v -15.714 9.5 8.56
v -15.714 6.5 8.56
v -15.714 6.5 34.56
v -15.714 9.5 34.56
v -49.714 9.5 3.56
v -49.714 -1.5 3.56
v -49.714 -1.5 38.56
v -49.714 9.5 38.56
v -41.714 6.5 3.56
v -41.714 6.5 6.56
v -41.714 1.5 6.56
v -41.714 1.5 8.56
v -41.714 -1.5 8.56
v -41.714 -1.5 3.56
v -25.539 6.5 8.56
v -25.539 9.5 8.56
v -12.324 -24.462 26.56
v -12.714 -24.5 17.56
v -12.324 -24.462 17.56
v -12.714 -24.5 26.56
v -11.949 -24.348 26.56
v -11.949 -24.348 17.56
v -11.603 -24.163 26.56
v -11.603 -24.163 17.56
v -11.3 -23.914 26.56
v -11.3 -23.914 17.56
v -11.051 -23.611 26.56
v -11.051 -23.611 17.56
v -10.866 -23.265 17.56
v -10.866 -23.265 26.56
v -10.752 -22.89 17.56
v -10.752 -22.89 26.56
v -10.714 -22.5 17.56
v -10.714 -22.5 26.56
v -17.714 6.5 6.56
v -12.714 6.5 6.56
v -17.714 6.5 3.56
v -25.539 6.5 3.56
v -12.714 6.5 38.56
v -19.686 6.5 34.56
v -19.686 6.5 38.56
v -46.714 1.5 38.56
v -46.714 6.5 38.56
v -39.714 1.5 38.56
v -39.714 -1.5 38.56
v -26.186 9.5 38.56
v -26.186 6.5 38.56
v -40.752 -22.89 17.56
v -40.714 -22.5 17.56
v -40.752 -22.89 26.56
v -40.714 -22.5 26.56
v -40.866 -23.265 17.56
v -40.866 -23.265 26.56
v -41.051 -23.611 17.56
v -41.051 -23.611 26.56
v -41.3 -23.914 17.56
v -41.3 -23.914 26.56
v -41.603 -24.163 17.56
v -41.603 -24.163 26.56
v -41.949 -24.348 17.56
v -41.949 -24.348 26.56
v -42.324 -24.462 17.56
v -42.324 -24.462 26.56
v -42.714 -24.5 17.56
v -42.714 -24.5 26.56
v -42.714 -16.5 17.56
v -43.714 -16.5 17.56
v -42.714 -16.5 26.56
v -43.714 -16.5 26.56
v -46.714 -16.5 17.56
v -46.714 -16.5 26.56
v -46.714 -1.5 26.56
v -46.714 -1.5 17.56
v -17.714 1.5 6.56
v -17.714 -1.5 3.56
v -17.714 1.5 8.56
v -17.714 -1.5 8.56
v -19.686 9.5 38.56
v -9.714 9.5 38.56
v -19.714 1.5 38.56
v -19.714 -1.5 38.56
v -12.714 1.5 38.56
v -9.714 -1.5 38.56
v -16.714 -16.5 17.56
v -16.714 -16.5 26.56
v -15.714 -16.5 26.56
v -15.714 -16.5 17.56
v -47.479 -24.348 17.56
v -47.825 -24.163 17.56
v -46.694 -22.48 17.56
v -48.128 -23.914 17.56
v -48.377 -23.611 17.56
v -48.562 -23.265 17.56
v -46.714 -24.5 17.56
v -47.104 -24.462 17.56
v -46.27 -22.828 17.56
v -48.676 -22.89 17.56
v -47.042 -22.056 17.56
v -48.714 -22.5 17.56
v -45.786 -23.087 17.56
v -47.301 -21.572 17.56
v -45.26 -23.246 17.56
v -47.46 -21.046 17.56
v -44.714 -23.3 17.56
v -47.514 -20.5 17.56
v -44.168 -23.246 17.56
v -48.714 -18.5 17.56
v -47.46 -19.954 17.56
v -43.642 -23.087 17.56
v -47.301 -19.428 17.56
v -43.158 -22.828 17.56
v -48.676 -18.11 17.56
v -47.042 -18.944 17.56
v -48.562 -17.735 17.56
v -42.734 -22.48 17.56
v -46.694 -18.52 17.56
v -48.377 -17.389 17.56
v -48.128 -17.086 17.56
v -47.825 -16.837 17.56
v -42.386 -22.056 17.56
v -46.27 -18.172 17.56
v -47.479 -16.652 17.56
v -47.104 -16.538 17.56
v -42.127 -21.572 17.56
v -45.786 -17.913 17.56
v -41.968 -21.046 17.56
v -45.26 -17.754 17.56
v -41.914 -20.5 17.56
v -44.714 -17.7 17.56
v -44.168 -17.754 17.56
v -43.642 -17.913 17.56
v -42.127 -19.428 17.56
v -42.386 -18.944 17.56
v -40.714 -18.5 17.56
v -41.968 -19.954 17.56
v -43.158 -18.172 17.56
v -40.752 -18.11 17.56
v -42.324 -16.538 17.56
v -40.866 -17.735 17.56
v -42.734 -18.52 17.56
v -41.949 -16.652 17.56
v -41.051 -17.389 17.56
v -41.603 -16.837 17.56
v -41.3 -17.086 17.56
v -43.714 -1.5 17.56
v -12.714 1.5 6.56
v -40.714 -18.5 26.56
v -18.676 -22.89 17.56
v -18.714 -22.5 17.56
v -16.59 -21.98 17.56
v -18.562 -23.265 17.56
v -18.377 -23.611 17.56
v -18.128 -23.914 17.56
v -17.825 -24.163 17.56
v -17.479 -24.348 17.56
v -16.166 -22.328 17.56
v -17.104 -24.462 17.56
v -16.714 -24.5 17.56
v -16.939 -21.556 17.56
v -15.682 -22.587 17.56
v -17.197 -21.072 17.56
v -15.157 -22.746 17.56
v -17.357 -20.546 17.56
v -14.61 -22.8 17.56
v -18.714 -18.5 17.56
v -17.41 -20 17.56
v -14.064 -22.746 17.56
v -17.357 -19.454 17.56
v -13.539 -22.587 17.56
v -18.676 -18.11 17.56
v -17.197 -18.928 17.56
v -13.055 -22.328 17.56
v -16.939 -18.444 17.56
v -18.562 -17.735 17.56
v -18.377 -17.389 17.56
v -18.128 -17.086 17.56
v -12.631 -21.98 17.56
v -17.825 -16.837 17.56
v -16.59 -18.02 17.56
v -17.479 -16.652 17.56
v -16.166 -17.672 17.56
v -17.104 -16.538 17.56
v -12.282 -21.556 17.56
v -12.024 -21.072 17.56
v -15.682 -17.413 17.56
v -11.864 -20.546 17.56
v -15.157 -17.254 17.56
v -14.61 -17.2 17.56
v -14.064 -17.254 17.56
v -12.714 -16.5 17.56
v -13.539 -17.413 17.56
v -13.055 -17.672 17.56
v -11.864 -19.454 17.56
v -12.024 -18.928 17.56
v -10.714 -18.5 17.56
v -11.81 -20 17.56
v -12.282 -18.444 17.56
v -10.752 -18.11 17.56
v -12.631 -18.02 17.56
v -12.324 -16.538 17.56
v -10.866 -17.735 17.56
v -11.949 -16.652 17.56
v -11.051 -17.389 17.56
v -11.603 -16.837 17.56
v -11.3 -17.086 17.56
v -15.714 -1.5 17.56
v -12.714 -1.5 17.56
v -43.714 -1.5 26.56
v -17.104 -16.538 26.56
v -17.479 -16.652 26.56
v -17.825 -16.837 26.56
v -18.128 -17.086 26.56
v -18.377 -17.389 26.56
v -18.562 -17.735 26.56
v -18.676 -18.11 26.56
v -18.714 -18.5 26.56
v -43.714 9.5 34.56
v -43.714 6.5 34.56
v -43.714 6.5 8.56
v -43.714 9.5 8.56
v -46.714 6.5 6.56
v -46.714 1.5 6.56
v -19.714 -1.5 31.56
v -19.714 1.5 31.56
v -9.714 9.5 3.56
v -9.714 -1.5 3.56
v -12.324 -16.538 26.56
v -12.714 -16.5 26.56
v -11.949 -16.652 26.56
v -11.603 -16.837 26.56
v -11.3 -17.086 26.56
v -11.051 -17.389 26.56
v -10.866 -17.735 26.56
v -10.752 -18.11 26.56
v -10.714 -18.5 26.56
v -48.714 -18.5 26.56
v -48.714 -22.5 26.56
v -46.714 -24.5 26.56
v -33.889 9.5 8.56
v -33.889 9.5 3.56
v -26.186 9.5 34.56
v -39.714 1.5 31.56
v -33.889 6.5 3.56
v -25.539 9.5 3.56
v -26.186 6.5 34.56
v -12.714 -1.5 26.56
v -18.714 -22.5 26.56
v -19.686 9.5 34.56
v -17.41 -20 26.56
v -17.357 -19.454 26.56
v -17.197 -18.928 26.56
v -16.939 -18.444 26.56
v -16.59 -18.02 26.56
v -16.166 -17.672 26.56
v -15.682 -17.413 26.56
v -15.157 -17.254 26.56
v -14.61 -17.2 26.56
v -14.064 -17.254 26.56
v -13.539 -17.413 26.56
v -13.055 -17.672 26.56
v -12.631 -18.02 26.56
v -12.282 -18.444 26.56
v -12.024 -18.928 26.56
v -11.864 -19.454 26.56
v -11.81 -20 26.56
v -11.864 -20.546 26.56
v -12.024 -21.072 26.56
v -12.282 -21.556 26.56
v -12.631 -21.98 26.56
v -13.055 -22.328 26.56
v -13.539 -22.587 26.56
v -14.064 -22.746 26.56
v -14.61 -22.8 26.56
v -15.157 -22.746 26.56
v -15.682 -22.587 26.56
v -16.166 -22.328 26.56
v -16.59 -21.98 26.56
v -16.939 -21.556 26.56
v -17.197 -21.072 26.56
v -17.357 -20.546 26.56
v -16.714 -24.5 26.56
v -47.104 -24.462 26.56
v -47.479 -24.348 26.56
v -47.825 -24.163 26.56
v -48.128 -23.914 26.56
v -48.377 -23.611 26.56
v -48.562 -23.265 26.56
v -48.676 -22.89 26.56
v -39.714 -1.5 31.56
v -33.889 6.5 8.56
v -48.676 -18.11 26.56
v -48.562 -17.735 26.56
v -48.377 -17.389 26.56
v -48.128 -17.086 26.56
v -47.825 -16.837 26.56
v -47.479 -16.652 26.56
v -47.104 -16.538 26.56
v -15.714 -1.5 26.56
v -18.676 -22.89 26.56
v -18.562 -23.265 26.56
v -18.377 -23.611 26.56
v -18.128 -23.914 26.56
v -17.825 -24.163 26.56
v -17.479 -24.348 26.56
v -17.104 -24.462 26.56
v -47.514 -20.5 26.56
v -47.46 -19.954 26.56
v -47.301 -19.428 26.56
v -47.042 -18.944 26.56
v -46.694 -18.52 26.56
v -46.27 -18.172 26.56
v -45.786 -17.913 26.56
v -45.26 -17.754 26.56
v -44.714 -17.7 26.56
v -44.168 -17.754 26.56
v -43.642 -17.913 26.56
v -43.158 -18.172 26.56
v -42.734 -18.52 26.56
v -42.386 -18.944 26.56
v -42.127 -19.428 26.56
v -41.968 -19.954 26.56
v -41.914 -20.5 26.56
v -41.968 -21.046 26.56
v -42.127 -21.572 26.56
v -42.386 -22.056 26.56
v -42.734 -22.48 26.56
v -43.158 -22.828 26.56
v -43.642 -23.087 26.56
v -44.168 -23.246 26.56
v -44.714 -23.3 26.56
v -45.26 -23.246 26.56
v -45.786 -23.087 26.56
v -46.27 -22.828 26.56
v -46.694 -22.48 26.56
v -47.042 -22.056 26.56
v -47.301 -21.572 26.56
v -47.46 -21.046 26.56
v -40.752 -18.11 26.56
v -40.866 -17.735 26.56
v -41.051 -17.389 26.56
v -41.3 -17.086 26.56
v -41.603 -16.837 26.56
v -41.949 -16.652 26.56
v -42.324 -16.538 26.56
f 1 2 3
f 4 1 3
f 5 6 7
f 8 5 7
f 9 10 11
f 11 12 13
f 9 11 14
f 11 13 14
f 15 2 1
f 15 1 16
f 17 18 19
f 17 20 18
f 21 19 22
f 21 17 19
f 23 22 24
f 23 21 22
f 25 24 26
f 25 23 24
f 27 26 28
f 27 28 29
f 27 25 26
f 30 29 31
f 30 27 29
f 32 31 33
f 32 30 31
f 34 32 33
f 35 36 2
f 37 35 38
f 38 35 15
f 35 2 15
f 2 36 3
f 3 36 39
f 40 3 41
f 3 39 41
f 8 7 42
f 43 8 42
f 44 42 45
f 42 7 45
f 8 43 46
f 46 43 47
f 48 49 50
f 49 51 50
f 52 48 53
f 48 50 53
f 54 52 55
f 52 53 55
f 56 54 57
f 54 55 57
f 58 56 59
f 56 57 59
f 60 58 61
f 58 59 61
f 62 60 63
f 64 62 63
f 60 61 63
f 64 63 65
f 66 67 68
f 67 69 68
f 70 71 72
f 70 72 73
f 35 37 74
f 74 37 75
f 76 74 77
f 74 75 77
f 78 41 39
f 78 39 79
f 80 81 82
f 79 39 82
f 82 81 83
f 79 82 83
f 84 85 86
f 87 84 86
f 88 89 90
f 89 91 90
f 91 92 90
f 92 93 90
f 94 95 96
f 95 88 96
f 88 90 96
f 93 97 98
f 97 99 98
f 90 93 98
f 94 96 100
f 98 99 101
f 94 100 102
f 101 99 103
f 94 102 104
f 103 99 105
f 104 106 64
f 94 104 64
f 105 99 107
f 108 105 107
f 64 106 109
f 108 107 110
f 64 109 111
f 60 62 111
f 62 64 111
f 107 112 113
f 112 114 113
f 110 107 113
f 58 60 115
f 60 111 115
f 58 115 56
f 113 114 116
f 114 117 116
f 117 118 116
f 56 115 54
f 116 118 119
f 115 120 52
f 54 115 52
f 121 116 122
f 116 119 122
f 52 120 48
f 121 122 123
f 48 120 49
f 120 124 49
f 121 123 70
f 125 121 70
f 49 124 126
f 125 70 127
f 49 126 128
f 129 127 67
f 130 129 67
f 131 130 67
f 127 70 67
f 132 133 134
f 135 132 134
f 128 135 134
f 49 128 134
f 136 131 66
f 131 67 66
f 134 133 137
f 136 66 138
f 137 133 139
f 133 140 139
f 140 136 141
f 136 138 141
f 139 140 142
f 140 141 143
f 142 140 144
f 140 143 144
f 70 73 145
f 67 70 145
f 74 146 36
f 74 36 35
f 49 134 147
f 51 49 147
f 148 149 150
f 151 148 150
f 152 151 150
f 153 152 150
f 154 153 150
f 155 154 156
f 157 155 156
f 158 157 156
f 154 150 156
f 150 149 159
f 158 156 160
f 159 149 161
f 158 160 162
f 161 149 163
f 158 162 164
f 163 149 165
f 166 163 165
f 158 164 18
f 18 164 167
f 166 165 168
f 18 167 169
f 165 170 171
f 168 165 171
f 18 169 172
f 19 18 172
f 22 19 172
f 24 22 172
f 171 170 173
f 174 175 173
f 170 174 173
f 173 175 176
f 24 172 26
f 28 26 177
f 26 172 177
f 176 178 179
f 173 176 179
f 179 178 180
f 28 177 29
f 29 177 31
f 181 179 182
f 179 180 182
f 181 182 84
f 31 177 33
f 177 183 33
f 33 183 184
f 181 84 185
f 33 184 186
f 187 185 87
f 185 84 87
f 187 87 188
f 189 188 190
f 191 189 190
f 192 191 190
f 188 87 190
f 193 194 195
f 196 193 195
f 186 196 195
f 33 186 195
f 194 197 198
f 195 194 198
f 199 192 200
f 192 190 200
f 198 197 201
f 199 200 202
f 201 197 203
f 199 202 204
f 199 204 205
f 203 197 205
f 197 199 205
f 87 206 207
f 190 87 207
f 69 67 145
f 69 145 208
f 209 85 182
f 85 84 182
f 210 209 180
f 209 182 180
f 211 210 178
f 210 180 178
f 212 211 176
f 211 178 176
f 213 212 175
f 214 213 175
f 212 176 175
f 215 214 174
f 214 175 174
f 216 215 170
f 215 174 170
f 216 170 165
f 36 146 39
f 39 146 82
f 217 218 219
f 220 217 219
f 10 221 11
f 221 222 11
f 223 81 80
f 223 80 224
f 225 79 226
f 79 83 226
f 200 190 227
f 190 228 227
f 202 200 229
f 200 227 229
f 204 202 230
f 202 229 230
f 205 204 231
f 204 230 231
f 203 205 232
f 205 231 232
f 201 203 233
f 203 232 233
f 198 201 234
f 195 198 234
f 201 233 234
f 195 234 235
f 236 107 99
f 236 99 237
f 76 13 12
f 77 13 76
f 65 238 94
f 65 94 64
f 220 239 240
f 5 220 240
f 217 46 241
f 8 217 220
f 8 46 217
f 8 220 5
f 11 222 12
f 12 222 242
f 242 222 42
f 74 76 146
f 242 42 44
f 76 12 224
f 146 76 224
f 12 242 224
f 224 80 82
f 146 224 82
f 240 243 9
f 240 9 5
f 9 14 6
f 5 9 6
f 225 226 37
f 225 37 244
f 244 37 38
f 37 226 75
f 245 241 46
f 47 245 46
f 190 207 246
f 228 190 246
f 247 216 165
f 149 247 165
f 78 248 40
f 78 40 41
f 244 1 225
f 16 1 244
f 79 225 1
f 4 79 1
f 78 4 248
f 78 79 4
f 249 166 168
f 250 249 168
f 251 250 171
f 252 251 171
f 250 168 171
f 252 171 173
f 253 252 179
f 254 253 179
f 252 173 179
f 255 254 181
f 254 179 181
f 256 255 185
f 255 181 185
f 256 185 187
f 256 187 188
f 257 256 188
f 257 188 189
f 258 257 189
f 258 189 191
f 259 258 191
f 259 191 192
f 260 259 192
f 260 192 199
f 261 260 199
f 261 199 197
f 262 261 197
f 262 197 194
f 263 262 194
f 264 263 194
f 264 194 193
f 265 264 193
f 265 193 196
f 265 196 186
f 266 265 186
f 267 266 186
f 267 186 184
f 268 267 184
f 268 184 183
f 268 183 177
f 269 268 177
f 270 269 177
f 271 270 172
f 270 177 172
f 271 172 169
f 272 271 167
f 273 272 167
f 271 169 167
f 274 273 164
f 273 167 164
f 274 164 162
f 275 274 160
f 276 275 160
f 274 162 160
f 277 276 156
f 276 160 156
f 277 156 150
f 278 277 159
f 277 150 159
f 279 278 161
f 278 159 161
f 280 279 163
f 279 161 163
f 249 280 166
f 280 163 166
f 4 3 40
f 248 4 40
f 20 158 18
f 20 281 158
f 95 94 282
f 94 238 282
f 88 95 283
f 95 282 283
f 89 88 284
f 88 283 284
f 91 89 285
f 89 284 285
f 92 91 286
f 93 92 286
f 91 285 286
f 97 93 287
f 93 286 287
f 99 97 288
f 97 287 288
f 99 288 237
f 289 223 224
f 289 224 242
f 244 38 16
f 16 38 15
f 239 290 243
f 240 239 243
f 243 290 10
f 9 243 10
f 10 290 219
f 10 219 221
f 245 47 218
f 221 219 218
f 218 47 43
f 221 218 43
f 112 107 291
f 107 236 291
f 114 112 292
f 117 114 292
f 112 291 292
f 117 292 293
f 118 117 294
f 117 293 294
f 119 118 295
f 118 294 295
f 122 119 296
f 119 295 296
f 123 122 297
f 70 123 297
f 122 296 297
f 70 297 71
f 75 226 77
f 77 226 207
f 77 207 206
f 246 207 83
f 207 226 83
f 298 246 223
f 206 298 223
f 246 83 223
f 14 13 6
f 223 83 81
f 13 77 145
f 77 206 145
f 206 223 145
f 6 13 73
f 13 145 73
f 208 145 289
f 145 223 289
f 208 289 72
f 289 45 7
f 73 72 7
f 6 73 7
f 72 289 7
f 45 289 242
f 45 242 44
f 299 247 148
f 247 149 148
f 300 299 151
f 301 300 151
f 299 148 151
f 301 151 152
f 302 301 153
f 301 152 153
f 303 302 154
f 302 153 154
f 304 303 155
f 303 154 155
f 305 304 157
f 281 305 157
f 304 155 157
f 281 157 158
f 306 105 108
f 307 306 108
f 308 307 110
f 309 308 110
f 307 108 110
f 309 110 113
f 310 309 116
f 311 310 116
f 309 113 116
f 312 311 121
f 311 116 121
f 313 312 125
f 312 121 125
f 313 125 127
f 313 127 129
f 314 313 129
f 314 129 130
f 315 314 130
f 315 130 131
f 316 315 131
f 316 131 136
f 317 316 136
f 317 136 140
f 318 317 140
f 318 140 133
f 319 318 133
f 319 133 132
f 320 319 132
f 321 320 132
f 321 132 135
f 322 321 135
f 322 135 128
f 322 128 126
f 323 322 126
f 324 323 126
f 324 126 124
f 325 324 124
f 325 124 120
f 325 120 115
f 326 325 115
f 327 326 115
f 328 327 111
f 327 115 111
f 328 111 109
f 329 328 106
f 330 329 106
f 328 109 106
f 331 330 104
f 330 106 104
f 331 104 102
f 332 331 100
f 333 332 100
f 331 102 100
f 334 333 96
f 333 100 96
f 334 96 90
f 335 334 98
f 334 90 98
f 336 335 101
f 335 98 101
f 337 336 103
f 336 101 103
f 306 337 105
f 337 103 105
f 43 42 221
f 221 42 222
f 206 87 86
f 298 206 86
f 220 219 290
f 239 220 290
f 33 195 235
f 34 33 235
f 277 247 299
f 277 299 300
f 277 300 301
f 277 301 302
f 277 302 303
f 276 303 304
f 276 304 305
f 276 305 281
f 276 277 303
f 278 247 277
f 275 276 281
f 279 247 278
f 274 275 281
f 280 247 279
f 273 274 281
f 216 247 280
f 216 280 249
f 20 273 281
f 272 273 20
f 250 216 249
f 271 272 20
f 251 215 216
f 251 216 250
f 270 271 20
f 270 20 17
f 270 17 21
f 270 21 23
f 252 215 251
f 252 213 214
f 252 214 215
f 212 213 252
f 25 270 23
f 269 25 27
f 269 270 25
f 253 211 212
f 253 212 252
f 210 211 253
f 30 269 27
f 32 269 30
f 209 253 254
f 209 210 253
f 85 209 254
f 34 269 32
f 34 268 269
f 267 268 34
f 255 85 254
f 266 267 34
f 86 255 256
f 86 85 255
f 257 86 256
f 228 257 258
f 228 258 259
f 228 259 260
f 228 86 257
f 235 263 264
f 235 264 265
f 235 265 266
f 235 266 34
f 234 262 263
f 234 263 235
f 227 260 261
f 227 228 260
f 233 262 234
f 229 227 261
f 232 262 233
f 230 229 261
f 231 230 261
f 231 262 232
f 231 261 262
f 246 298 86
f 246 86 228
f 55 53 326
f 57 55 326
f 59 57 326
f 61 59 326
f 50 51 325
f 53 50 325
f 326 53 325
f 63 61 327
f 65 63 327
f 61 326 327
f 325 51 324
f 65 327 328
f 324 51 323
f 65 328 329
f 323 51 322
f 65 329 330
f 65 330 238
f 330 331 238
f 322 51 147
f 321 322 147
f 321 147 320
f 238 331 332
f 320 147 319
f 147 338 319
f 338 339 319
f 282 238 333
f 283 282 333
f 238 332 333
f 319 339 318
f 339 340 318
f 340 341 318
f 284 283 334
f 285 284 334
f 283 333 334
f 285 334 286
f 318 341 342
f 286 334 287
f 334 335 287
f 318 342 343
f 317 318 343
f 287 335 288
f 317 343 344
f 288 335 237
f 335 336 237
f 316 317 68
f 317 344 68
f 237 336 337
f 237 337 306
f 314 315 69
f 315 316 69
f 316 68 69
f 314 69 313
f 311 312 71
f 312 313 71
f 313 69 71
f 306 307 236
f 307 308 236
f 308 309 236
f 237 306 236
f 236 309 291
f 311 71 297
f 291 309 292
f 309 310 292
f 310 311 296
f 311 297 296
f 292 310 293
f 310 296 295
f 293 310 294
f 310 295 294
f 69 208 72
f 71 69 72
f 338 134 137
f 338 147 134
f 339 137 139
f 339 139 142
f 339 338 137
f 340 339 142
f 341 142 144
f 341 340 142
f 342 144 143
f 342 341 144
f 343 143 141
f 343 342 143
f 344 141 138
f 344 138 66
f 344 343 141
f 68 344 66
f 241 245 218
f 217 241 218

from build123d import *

# Parameters (mm, degrees)
F1_DEPTH  = 1.5
F2_W      = 3
F2_H      = 9
F3_DEPTH  = 15
F4_W      = 2
F4_H      = 9
F5_DEPTH  = 8
F7_D      = 5.6
F8_R      = 1.99999
F9_W      = 5
F9_H      = 3
F10_DEPTH = 3
F12_DEPTH = 2
F13_DEPTH = 2
F14_W     = 3
F14_H     = 4
F14_W_2   = 2
F14_H_2   = 3
F14_W_3   = 9.8253687732
F14_H_3   = 5
F15_DEPTH = 3
F16_W     = 6.5
F16_H     = 4
F17_DEPTH = 3


# Not quite as in the source:
# - a fillet or chamfer is up to 0.001 mm smaller than in the source, because OpenCascade refuses the exact size


with BuildPart() as f1:
    # F0 (on Front) → F1 (new body, symmetric)
    with BuildSketch(Plane.XZ):
        Polygon((-46.7140089311, 21.8801796436), (-46.7140089311, 6.5596503988), (-41.7140089311, 6.5596503988), (-41.7140089311, 8.5596503988), (-29.7140089311, 8.5596503988), (-29.7140089311, 21.8801796436), align=None)
        Polygon((-46.7140089311, 38.5596503988), (-46.7140089311, 21.8801796436), (-29.7140089311, 21.8801796436), (-29.7140089311, 31.5596503988), (-39.7140089311, 31.5596503988), (-39.7140089311, 38.5596503988), align=None)
        Polygon((-12.7140089311, 21.8801796436), (-29.7140089311, 21.8801796436), (-29.7140089311, 8.5596503988), (-17.7140089311, 8.5596503988), (-17.7140089311, 6.5596503988), (-12.7140089311, 6.5596503988), align=None)
        Polygon((-29.7140089311, 31.5596503988), (-29.7140089311, 21.8801796436), (-12.7140089311, 21.8801796436), (-12.7140089311, 38.5596503988), (-19.7140089311, 38.5596503988), (-19.7140089311, 31.5596503988), align=None)
    extrude(amount=F1_DEPTH, both=True)

    # F2 (on face) → F3 (join)
    with BuildSketch(Plane.XZ.offset(1.5)):
        with Locations((-45.2140089311, 22.0596503988)):
            Rectangle(F2_W, F2_H)
        with Locations((-14.2140089311, 22.0596503988)):
            Rectangle(F2_W, F2_H)
    extrude(amount=F3_DEPTH)

    # F4 (on face) → F5 (join)
    with BuildSketch(Plane.XZ.offset(16.5)):
        Polygon((-44.7140089311, 26.5596503988), (-46.7140089311, 26.5596503988), (-46.7140089311, 17.5596503988), (-43.7140089311, 17.5596503988), (-40.7140089311, 17.5596503988), (-40.7140089311, 26.5596503988), (-43.7140089311, 26.5596503988), align=None)
        with Locations((-47.7140089311, 22.0596503988)):
            Rectangle(F4_W, F4_H)
        Polygon((-12.7140089311, 17.5596503988), (-12.7140089311, 26.5596503988), (-14.7140089311, 26.5596503988), (-15.7140089311, 26.5596503988), (-18.7140089311, 26.5596503988), (-18.7140089311, 17.5596503988), (-15.7140089311, 17.5596503988), align=None)
        with Locations((-11.7140089311, 22.0596503988)):
            Rectangle(F4_W, F4_H)
    extrude(amount=F5_DEPTH)

    # F7 (through all)
    with Locations(Plane.XY.offset(26.5596503988)):
        with Locations((-44.7140089311, -20.5), (-14.6104083322, -20)):
            Hole(F7_D / 2)

    # F8 (radius 2 in the source; OpenCascade refuses exactly that, so slightly less here)
    f8_edges = [f1.edges().sort_by_distance(p)[0] for p in [
        (-10.714009, -16.5, 22.05965),
        (-18.714009, -16.5, 22.05965),
        (-18.714009, -24.5, 22.05965),
        (-10.714009, -24.5, 22.05965),
        (-48.714009, -24.5, 22.05965),
        (-48.714009, -16.5, 22.05965),
        (-40.714009, -16.5, 22.05965),
        (-40.714009, -24.5, 22.05965),
    ]]
    fillet(f8_edges, radius=F8_R)

    # F9 (on face) → F10 (join, symmetric)
    with BuildSketch(Plane(origin=(0, 1.5, 0), x_dir=(-1, 0, 0), z_dir=(0, 1, 0))):
        Polygon((12.7140089311, 6.5596503988), (12.7140089311, 38.5596503988), (9.7140089311, 38.5596503988), (9.7140089311, 3.5596503988), (12.7140089311, 3.5596503988), align=None)
        with Locations((15.2140089311, 5.0596503988)):
            Rectangle(F9_W, F9_H)
        with Locations((44.2140089311, 5.0596503988)):
            Rectangle(F9_W, F9_H)
        Polygon((49.7140089311, 38.5596503988), (46.7140089311, 38.5596503988), (46.7140089311, 6.5596503988), (46.7140089311, 3.5596503988), (49.7140089311, 3.5596503988), align=None)
    extrude(amount=F10_DEPTH, both=True)

    # F11 (on face) → F12 (join)
    with BuildSketch(Plane(origin=(0, 4.5, 0), x_dir=(-1, 0, 0), z_dir=(0, 1, 0))):
        Polygon((49.7140089311, 3.5596503988), (49.7140089311, 38.5596503988), (46.7140089311, 38.5596503988), (46.7140089311, 6.5596503988), (41.7140089311, 6.5596503988), (41.7140089311, 3.5596503988), align=None)
    extrude(amount=F12_DEPTH)

    # F13 (add): a face of the model
    f13_faces = [f1.faces().sort_by_distance(p)[0] for p in [
        (-11.7140089311, 4.5, 19.0596503988),
    ]]
    extrude(f13_faces, amount=F13_DEPTH)

    # F14 (on face) → F15 (join)
    with BuildSketch(Plane(origin=(0, 6.5, 0), x_dir=(-1, 0, 0), z_dir=(0, 1, 0))):
        with Locations((48.2140089311, 36.5596503988)):
            Rectangle(F14_W, F14_H)
        Polygon((46.7140089311, 34.5596503988), (46.7140089311, 38.5596503988), (9.7140089311, 38.5596503988), (9.7140089311, 34.5596503988), (15.7140089311, 34.5596503988), (43.7140089311, 34.5596503988), align=None)
        Polygon((49.7140089311, 3.5596503988), (49.7140089311, 34.5596503988), (46.7140089311, 34.5596503988), (46.7140089311, 6.5596503988), (43.7140089311, 6.5596503988), (43.7140089311, 3.5596503988), align=None)
        Polygon((46.7140089311, 6.5596503988), (46.7140089311, 34.5596503988), (43.7140089311, 34.5596503988), (43.7140089311, 8.5596503988), (43.7140089311, 6.5596503988), align=None)
        Polygon((15.7140089311, 34.5596503988), (9.7140089311, 34.5596503988), (9.7140089311, 3.5596503988), (15.7140089311, 3.5596503988), (15.7140089311, 8.5596503988), align=None)
        with Locations((42.7140089311, 5.0596503988)):
            Rectangle(F14_W_2, F14_H_2)
        Polygon((43.7140089311, 6.5596503988), (43.7140089311, 8.5596503988), (33.8886401579, 8.5596503988), (33.8886401579, 3.5596503988), (41.7140089311, 3.5596503988), (41.7140089311, 6.5596503988), align=None)
        with Locations((20.6266933177, 6.0596503988)):
            Rectangle(F14_W_3, F14_H_3)
    extrude(amount=F15_DEPTH)

    # F16 (on face) → F17 (cut)
    with BuildSketch(Plane(origin=(0, 9.5, 0), x_dir=(-1, 0, 0), z_dir=(0, 1, 0))):
        with Locations((22.9359017015, 36.5596503988)):
            Rectangle(F16_W, F16_H)
    extrude(amount=-F17_DEPTH, mode=Mode.SUBTRACT)


solid = f1.part
